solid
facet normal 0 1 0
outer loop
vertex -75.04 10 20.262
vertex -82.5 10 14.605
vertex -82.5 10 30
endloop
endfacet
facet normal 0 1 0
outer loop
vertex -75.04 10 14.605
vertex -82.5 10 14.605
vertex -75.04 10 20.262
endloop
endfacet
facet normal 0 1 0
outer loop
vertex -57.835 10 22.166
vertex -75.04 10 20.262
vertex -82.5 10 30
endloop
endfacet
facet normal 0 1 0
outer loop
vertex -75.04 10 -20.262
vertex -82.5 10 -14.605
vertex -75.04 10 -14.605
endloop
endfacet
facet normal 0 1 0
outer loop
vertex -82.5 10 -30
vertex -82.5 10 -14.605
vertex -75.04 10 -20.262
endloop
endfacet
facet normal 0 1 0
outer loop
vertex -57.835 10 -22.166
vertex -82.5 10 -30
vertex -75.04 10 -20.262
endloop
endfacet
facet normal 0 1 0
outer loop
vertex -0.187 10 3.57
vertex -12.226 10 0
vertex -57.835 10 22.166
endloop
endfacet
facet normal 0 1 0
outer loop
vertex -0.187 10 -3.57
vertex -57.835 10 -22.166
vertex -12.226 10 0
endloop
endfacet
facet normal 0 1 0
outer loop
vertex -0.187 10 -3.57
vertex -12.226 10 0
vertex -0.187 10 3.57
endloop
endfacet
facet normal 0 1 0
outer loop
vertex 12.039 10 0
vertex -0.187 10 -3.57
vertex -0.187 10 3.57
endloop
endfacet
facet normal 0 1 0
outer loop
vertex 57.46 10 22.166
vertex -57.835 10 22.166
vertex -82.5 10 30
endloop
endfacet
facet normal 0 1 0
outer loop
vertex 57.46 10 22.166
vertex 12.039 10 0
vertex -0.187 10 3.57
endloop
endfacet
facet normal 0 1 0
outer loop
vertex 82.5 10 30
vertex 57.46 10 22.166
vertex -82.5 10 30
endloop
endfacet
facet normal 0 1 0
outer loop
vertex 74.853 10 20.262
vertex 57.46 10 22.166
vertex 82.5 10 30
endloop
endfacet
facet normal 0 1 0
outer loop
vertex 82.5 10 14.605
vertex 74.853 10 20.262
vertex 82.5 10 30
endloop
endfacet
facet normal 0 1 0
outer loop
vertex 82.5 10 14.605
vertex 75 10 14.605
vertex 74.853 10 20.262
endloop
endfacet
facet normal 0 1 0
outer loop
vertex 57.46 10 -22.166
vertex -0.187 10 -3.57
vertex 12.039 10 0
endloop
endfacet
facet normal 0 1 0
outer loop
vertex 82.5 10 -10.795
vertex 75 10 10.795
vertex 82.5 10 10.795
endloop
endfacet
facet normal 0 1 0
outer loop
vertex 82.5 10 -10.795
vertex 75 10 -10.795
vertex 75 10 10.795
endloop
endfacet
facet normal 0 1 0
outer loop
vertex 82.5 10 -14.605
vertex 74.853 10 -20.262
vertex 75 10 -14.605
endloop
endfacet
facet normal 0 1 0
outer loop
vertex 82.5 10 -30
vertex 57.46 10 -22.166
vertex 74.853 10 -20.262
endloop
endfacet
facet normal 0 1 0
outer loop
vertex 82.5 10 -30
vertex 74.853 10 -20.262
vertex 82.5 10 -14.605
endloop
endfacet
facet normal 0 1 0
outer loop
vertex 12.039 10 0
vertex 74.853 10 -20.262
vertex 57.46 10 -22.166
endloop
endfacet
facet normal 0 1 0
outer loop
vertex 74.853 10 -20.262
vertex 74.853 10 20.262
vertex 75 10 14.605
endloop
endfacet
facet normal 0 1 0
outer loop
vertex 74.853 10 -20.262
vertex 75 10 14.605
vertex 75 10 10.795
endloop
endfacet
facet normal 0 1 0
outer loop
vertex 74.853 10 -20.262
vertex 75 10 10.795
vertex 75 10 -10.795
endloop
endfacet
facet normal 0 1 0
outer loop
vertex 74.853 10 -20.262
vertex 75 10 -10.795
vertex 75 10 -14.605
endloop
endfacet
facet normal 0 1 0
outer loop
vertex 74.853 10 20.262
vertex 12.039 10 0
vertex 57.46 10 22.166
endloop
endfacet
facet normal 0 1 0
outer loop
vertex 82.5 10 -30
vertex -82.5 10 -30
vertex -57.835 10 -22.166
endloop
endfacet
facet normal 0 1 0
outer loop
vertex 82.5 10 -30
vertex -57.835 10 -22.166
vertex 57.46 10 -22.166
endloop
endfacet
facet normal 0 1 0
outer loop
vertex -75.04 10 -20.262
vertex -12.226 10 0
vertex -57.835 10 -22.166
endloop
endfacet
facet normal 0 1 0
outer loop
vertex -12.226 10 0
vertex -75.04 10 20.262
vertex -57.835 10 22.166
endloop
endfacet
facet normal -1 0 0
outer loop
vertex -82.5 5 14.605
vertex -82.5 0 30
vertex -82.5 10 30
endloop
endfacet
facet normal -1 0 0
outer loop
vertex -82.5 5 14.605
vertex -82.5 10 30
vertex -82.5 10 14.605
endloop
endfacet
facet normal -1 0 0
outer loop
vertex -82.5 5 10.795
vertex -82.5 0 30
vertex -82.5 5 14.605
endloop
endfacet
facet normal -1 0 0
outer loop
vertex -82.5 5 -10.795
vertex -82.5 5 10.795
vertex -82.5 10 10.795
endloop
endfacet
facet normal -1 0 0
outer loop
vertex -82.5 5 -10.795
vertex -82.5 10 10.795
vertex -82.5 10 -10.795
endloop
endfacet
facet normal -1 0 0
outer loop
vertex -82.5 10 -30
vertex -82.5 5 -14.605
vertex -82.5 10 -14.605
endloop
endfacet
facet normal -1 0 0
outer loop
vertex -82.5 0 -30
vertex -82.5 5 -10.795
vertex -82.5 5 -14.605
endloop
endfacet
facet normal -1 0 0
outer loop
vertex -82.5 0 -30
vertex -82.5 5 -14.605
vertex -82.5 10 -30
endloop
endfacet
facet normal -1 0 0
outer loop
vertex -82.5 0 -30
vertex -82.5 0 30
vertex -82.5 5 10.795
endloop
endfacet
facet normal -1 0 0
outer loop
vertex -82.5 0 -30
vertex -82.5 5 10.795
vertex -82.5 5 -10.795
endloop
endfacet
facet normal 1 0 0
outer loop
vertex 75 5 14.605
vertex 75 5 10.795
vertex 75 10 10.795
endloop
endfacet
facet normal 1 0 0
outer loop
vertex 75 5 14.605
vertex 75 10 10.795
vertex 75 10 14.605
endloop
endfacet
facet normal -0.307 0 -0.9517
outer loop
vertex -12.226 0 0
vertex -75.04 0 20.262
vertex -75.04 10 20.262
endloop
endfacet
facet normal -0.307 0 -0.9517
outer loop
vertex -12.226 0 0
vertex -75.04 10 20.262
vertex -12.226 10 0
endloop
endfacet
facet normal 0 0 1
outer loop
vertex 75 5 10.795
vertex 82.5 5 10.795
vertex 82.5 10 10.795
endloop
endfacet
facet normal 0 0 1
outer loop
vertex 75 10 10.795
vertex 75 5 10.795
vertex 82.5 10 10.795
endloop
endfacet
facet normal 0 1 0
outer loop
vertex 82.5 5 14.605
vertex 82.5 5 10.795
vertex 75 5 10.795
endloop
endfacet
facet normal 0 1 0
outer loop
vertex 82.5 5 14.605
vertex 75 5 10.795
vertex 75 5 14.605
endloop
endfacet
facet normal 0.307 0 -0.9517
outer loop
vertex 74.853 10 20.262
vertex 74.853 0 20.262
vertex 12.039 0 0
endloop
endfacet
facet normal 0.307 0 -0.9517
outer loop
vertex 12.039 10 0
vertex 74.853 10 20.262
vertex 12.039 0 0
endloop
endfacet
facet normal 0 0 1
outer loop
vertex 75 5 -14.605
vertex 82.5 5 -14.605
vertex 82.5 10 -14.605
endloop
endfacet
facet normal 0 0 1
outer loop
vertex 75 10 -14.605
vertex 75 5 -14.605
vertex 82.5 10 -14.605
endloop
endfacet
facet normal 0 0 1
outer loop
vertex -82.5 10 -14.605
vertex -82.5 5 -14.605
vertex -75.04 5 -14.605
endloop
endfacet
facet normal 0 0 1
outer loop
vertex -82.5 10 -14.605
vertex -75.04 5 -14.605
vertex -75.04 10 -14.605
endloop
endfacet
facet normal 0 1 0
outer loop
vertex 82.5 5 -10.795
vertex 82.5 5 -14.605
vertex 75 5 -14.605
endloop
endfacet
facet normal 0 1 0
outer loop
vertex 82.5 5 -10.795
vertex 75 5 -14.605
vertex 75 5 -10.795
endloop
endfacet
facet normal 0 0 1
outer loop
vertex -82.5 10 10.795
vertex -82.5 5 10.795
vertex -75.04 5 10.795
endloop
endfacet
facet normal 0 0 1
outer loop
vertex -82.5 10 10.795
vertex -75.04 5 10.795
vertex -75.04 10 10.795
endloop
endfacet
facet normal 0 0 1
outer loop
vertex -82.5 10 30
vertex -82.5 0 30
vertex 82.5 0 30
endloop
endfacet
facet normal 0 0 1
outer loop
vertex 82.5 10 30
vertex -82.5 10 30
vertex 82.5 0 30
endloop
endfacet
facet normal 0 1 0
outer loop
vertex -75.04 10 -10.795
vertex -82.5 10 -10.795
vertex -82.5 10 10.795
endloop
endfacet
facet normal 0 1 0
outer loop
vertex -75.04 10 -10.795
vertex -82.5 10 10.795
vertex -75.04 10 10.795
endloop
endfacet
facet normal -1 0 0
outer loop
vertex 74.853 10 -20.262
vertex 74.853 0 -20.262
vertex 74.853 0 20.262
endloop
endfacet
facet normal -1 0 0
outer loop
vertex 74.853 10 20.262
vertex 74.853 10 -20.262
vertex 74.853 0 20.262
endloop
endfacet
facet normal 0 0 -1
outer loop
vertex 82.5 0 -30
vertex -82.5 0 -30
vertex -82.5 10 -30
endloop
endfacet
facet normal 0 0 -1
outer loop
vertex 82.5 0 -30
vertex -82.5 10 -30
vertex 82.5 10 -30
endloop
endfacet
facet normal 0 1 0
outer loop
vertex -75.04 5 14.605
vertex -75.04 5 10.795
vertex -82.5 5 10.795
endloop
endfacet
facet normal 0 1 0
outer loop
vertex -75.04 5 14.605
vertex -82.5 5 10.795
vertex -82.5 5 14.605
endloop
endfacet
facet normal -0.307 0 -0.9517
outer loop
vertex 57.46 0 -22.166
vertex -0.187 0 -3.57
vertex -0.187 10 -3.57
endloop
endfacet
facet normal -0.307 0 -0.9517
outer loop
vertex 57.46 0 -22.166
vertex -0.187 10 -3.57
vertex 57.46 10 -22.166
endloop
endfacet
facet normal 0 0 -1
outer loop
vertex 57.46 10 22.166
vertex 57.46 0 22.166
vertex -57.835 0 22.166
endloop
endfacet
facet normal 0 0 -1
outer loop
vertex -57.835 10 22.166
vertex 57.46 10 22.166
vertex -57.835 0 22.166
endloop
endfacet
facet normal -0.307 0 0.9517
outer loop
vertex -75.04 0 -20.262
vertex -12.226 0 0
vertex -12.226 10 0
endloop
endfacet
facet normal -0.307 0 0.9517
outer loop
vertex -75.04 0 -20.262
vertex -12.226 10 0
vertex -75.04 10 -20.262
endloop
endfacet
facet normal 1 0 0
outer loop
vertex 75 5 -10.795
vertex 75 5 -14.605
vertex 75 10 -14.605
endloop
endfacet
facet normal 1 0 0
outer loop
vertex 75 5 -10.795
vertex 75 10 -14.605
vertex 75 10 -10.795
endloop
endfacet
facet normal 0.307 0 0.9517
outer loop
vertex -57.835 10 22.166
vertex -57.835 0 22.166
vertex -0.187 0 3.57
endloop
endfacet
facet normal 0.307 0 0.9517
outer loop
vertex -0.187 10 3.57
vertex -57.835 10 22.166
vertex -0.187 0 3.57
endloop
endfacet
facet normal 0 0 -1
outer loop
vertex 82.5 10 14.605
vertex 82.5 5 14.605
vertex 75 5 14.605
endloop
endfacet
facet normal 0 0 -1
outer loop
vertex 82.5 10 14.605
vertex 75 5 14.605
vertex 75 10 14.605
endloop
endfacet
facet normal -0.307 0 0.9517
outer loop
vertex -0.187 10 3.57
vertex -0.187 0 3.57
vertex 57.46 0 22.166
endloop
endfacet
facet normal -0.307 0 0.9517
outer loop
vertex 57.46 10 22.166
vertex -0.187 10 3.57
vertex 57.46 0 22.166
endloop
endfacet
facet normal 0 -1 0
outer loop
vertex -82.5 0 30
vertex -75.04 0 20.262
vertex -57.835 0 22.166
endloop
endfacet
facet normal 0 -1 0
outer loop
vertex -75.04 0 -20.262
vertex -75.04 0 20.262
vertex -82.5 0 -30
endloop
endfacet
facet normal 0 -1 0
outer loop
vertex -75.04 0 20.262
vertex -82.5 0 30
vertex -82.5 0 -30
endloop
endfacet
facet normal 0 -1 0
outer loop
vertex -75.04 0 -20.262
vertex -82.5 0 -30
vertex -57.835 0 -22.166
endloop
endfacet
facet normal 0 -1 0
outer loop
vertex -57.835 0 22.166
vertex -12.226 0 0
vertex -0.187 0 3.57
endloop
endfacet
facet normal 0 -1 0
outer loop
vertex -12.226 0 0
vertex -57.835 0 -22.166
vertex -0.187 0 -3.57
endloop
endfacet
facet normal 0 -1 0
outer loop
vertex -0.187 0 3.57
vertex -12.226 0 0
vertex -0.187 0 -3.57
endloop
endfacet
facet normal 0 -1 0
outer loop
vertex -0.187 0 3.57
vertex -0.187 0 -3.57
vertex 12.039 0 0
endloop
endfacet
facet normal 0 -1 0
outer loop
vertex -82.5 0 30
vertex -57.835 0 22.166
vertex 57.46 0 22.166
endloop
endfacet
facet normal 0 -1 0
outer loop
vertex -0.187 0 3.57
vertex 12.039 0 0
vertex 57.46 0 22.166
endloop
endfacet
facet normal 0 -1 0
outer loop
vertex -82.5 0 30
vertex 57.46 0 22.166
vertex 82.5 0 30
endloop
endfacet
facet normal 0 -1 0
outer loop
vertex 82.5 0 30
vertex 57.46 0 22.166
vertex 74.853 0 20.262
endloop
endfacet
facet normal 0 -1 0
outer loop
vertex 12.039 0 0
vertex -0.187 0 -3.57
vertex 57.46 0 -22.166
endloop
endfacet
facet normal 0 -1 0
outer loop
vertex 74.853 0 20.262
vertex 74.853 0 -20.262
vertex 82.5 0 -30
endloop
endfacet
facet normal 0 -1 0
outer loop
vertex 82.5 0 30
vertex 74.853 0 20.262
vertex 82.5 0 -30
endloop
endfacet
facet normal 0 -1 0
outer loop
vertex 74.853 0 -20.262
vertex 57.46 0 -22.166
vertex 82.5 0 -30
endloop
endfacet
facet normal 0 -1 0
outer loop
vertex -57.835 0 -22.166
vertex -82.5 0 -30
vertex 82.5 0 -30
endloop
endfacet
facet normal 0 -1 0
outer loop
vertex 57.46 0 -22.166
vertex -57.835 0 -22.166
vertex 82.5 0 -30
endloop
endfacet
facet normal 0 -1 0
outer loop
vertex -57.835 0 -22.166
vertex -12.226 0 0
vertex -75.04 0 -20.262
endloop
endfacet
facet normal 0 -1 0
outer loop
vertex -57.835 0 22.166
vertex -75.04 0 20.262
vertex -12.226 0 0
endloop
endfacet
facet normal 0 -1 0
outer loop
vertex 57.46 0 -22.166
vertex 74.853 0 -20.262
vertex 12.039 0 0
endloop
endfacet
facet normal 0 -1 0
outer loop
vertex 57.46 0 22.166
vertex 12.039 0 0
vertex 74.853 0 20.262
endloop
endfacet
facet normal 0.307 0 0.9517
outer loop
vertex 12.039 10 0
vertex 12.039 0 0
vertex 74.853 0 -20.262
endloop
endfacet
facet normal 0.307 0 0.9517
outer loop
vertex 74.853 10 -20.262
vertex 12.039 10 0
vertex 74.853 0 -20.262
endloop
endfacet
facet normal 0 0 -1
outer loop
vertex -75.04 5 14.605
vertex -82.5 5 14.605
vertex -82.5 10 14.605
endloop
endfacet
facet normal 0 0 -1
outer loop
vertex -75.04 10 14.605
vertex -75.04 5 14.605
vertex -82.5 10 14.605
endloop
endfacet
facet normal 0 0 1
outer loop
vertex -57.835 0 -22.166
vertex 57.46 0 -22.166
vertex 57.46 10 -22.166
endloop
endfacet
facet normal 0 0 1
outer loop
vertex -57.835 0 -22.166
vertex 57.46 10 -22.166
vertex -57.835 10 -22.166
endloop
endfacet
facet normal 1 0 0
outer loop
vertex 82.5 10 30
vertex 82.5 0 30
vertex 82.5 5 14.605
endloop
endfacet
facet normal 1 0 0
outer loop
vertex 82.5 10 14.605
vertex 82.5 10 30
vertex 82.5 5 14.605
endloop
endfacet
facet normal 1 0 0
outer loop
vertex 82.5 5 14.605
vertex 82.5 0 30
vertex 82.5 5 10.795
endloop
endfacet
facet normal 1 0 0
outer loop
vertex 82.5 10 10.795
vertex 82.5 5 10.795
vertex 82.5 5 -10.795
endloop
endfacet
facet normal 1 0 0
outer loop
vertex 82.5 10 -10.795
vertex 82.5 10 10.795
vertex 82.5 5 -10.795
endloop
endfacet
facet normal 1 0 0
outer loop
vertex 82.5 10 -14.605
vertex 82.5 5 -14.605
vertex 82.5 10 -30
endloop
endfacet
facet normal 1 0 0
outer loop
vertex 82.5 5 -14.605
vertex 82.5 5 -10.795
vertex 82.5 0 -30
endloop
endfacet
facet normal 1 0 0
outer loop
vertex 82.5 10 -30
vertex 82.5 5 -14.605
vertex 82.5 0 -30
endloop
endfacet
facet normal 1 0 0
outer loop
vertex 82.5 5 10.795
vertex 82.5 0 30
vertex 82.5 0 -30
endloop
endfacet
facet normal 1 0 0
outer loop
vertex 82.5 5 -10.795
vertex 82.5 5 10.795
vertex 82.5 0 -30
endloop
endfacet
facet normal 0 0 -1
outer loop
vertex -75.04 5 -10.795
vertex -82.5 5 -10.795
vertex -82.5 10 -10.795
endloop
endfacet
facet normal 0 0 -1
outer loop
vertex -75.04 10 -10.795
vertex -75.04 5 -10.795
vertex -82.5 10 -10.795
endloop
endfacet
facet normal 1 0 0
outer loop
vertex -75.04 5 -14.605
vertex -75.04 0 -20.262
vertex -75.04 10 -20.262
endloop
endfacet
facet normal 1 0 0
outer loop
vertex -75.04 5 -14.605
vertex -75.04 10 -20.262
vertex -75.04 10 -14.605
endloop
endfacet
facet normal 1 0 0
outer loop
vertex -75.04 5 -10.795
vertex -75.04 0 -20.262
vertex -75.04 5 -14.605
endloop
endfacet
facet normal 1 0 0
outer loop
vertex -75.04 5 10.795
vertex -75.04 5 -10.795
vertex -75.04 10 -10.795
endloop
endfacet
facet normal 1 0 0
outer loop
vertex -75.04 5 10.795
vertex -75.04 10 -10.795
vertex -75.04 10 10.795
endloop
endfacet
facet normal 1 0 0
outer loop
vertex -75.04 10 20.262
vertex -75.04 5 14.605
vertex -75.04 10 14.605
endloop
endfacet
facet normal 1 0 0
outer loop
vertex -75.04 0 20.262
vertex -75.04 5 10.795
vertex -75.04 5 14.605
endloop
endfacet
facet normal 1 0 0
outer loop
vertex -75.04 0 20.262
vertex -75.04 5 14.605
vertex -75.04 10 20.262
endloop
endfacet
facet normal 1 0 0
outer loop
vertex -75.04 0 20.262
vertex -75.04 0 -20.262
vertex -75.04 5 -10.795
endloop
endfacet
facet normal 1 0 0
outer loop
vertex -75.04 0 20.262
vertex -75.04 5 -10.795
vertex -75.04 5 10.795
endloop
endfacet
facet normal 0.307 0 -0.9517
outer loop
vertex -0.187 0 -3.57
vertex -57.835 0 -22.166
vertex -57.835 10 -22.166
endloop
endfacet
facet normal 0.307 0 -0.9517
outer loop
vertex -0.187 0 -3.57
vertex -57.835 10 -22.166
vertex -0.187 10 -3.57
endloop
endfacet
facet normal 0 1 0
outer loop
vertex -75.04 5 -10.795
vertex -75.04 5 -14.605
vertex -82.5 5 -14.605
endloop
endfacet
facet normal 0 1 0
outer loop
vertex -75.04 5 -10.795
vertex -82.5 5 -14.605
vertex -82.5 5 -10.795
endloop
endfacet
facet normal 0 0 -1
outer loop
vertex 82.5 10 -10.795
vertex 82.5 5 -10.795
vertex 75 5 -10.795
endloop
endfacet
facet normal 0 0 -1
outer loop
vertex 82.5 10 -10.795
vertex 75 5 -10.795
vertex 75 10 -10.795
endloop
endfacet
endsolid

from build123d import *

# Parameters (mm, degrees)
SKETCH1_W           = 165
SKETCH1_H           = 60
BOSS_EXTRUDE1_DEPTH = 10
SKETCH2_W           = 3.81
SKETCH2_H           = 5
CUT_EXTRUDE1_DEPTH  = 7.5


with BuildPart() as part:
    # Sketch1 → Boss-Extrude1 (new body)
    with BuildSketch(Plane(origin=(0, 0, 0), x_dir=(1, 0, 0), z_dir=(0, 1, 0))):
        Rectangle(SKETCH1_W, SKETCH1_H)
        Polygon((-75.04, 20.262432489), (-75.04, -20.262432489), (-12.226459283, 0), align=None, mode=Mode.SUBTRACT)
        Polygon((57.460458264, 22.165834991), (-57.834623171, 22.165834991), (-0.187082453, 3.569854115), align=None, mode=Mode.SUBTRACT)
        Polygon((74.852917547, 20.262432489), (74.852917547, -20.262432489), (12.039376829, 0), align=None, mode=Mode.SUBTRACT)
        Polygon((-57.834623171, -22.165834991), (-0.187082453, -3.569854115), (57.460458264, -22.165834991), align=None, mode=Mode.SUBTRACT)
    extrude(amount=BOSS_EXTRUDE1_DEPTH)

    # Sketch2 → Cut-Extrude1 (cut)
    with BuildSketch(Plane.ZY.offset(82.5)):
        with Locations((-12.7, 7.5)):
            Rectangle(SKETCH2_W, SKETCH2_H)
        with Locations((12.7, 7.5)):
            Rectangle(SKETCH2_W, SKETCH2_H)
    cut_extrude1 = extrude(amount=-CUT_EXTRUDE1_DEPTH, mode=Mode.SUBTRACT)

    # Mirror1: Cut-Extrude1 across plane
    add(cut_extrude1.mirror(Plane(origin=(0, 0, 0), x_dir=(0, 0, 1), z_dir=(1, 0, 0))), mode=Mode.SUBTRACT)


solid = part.part
